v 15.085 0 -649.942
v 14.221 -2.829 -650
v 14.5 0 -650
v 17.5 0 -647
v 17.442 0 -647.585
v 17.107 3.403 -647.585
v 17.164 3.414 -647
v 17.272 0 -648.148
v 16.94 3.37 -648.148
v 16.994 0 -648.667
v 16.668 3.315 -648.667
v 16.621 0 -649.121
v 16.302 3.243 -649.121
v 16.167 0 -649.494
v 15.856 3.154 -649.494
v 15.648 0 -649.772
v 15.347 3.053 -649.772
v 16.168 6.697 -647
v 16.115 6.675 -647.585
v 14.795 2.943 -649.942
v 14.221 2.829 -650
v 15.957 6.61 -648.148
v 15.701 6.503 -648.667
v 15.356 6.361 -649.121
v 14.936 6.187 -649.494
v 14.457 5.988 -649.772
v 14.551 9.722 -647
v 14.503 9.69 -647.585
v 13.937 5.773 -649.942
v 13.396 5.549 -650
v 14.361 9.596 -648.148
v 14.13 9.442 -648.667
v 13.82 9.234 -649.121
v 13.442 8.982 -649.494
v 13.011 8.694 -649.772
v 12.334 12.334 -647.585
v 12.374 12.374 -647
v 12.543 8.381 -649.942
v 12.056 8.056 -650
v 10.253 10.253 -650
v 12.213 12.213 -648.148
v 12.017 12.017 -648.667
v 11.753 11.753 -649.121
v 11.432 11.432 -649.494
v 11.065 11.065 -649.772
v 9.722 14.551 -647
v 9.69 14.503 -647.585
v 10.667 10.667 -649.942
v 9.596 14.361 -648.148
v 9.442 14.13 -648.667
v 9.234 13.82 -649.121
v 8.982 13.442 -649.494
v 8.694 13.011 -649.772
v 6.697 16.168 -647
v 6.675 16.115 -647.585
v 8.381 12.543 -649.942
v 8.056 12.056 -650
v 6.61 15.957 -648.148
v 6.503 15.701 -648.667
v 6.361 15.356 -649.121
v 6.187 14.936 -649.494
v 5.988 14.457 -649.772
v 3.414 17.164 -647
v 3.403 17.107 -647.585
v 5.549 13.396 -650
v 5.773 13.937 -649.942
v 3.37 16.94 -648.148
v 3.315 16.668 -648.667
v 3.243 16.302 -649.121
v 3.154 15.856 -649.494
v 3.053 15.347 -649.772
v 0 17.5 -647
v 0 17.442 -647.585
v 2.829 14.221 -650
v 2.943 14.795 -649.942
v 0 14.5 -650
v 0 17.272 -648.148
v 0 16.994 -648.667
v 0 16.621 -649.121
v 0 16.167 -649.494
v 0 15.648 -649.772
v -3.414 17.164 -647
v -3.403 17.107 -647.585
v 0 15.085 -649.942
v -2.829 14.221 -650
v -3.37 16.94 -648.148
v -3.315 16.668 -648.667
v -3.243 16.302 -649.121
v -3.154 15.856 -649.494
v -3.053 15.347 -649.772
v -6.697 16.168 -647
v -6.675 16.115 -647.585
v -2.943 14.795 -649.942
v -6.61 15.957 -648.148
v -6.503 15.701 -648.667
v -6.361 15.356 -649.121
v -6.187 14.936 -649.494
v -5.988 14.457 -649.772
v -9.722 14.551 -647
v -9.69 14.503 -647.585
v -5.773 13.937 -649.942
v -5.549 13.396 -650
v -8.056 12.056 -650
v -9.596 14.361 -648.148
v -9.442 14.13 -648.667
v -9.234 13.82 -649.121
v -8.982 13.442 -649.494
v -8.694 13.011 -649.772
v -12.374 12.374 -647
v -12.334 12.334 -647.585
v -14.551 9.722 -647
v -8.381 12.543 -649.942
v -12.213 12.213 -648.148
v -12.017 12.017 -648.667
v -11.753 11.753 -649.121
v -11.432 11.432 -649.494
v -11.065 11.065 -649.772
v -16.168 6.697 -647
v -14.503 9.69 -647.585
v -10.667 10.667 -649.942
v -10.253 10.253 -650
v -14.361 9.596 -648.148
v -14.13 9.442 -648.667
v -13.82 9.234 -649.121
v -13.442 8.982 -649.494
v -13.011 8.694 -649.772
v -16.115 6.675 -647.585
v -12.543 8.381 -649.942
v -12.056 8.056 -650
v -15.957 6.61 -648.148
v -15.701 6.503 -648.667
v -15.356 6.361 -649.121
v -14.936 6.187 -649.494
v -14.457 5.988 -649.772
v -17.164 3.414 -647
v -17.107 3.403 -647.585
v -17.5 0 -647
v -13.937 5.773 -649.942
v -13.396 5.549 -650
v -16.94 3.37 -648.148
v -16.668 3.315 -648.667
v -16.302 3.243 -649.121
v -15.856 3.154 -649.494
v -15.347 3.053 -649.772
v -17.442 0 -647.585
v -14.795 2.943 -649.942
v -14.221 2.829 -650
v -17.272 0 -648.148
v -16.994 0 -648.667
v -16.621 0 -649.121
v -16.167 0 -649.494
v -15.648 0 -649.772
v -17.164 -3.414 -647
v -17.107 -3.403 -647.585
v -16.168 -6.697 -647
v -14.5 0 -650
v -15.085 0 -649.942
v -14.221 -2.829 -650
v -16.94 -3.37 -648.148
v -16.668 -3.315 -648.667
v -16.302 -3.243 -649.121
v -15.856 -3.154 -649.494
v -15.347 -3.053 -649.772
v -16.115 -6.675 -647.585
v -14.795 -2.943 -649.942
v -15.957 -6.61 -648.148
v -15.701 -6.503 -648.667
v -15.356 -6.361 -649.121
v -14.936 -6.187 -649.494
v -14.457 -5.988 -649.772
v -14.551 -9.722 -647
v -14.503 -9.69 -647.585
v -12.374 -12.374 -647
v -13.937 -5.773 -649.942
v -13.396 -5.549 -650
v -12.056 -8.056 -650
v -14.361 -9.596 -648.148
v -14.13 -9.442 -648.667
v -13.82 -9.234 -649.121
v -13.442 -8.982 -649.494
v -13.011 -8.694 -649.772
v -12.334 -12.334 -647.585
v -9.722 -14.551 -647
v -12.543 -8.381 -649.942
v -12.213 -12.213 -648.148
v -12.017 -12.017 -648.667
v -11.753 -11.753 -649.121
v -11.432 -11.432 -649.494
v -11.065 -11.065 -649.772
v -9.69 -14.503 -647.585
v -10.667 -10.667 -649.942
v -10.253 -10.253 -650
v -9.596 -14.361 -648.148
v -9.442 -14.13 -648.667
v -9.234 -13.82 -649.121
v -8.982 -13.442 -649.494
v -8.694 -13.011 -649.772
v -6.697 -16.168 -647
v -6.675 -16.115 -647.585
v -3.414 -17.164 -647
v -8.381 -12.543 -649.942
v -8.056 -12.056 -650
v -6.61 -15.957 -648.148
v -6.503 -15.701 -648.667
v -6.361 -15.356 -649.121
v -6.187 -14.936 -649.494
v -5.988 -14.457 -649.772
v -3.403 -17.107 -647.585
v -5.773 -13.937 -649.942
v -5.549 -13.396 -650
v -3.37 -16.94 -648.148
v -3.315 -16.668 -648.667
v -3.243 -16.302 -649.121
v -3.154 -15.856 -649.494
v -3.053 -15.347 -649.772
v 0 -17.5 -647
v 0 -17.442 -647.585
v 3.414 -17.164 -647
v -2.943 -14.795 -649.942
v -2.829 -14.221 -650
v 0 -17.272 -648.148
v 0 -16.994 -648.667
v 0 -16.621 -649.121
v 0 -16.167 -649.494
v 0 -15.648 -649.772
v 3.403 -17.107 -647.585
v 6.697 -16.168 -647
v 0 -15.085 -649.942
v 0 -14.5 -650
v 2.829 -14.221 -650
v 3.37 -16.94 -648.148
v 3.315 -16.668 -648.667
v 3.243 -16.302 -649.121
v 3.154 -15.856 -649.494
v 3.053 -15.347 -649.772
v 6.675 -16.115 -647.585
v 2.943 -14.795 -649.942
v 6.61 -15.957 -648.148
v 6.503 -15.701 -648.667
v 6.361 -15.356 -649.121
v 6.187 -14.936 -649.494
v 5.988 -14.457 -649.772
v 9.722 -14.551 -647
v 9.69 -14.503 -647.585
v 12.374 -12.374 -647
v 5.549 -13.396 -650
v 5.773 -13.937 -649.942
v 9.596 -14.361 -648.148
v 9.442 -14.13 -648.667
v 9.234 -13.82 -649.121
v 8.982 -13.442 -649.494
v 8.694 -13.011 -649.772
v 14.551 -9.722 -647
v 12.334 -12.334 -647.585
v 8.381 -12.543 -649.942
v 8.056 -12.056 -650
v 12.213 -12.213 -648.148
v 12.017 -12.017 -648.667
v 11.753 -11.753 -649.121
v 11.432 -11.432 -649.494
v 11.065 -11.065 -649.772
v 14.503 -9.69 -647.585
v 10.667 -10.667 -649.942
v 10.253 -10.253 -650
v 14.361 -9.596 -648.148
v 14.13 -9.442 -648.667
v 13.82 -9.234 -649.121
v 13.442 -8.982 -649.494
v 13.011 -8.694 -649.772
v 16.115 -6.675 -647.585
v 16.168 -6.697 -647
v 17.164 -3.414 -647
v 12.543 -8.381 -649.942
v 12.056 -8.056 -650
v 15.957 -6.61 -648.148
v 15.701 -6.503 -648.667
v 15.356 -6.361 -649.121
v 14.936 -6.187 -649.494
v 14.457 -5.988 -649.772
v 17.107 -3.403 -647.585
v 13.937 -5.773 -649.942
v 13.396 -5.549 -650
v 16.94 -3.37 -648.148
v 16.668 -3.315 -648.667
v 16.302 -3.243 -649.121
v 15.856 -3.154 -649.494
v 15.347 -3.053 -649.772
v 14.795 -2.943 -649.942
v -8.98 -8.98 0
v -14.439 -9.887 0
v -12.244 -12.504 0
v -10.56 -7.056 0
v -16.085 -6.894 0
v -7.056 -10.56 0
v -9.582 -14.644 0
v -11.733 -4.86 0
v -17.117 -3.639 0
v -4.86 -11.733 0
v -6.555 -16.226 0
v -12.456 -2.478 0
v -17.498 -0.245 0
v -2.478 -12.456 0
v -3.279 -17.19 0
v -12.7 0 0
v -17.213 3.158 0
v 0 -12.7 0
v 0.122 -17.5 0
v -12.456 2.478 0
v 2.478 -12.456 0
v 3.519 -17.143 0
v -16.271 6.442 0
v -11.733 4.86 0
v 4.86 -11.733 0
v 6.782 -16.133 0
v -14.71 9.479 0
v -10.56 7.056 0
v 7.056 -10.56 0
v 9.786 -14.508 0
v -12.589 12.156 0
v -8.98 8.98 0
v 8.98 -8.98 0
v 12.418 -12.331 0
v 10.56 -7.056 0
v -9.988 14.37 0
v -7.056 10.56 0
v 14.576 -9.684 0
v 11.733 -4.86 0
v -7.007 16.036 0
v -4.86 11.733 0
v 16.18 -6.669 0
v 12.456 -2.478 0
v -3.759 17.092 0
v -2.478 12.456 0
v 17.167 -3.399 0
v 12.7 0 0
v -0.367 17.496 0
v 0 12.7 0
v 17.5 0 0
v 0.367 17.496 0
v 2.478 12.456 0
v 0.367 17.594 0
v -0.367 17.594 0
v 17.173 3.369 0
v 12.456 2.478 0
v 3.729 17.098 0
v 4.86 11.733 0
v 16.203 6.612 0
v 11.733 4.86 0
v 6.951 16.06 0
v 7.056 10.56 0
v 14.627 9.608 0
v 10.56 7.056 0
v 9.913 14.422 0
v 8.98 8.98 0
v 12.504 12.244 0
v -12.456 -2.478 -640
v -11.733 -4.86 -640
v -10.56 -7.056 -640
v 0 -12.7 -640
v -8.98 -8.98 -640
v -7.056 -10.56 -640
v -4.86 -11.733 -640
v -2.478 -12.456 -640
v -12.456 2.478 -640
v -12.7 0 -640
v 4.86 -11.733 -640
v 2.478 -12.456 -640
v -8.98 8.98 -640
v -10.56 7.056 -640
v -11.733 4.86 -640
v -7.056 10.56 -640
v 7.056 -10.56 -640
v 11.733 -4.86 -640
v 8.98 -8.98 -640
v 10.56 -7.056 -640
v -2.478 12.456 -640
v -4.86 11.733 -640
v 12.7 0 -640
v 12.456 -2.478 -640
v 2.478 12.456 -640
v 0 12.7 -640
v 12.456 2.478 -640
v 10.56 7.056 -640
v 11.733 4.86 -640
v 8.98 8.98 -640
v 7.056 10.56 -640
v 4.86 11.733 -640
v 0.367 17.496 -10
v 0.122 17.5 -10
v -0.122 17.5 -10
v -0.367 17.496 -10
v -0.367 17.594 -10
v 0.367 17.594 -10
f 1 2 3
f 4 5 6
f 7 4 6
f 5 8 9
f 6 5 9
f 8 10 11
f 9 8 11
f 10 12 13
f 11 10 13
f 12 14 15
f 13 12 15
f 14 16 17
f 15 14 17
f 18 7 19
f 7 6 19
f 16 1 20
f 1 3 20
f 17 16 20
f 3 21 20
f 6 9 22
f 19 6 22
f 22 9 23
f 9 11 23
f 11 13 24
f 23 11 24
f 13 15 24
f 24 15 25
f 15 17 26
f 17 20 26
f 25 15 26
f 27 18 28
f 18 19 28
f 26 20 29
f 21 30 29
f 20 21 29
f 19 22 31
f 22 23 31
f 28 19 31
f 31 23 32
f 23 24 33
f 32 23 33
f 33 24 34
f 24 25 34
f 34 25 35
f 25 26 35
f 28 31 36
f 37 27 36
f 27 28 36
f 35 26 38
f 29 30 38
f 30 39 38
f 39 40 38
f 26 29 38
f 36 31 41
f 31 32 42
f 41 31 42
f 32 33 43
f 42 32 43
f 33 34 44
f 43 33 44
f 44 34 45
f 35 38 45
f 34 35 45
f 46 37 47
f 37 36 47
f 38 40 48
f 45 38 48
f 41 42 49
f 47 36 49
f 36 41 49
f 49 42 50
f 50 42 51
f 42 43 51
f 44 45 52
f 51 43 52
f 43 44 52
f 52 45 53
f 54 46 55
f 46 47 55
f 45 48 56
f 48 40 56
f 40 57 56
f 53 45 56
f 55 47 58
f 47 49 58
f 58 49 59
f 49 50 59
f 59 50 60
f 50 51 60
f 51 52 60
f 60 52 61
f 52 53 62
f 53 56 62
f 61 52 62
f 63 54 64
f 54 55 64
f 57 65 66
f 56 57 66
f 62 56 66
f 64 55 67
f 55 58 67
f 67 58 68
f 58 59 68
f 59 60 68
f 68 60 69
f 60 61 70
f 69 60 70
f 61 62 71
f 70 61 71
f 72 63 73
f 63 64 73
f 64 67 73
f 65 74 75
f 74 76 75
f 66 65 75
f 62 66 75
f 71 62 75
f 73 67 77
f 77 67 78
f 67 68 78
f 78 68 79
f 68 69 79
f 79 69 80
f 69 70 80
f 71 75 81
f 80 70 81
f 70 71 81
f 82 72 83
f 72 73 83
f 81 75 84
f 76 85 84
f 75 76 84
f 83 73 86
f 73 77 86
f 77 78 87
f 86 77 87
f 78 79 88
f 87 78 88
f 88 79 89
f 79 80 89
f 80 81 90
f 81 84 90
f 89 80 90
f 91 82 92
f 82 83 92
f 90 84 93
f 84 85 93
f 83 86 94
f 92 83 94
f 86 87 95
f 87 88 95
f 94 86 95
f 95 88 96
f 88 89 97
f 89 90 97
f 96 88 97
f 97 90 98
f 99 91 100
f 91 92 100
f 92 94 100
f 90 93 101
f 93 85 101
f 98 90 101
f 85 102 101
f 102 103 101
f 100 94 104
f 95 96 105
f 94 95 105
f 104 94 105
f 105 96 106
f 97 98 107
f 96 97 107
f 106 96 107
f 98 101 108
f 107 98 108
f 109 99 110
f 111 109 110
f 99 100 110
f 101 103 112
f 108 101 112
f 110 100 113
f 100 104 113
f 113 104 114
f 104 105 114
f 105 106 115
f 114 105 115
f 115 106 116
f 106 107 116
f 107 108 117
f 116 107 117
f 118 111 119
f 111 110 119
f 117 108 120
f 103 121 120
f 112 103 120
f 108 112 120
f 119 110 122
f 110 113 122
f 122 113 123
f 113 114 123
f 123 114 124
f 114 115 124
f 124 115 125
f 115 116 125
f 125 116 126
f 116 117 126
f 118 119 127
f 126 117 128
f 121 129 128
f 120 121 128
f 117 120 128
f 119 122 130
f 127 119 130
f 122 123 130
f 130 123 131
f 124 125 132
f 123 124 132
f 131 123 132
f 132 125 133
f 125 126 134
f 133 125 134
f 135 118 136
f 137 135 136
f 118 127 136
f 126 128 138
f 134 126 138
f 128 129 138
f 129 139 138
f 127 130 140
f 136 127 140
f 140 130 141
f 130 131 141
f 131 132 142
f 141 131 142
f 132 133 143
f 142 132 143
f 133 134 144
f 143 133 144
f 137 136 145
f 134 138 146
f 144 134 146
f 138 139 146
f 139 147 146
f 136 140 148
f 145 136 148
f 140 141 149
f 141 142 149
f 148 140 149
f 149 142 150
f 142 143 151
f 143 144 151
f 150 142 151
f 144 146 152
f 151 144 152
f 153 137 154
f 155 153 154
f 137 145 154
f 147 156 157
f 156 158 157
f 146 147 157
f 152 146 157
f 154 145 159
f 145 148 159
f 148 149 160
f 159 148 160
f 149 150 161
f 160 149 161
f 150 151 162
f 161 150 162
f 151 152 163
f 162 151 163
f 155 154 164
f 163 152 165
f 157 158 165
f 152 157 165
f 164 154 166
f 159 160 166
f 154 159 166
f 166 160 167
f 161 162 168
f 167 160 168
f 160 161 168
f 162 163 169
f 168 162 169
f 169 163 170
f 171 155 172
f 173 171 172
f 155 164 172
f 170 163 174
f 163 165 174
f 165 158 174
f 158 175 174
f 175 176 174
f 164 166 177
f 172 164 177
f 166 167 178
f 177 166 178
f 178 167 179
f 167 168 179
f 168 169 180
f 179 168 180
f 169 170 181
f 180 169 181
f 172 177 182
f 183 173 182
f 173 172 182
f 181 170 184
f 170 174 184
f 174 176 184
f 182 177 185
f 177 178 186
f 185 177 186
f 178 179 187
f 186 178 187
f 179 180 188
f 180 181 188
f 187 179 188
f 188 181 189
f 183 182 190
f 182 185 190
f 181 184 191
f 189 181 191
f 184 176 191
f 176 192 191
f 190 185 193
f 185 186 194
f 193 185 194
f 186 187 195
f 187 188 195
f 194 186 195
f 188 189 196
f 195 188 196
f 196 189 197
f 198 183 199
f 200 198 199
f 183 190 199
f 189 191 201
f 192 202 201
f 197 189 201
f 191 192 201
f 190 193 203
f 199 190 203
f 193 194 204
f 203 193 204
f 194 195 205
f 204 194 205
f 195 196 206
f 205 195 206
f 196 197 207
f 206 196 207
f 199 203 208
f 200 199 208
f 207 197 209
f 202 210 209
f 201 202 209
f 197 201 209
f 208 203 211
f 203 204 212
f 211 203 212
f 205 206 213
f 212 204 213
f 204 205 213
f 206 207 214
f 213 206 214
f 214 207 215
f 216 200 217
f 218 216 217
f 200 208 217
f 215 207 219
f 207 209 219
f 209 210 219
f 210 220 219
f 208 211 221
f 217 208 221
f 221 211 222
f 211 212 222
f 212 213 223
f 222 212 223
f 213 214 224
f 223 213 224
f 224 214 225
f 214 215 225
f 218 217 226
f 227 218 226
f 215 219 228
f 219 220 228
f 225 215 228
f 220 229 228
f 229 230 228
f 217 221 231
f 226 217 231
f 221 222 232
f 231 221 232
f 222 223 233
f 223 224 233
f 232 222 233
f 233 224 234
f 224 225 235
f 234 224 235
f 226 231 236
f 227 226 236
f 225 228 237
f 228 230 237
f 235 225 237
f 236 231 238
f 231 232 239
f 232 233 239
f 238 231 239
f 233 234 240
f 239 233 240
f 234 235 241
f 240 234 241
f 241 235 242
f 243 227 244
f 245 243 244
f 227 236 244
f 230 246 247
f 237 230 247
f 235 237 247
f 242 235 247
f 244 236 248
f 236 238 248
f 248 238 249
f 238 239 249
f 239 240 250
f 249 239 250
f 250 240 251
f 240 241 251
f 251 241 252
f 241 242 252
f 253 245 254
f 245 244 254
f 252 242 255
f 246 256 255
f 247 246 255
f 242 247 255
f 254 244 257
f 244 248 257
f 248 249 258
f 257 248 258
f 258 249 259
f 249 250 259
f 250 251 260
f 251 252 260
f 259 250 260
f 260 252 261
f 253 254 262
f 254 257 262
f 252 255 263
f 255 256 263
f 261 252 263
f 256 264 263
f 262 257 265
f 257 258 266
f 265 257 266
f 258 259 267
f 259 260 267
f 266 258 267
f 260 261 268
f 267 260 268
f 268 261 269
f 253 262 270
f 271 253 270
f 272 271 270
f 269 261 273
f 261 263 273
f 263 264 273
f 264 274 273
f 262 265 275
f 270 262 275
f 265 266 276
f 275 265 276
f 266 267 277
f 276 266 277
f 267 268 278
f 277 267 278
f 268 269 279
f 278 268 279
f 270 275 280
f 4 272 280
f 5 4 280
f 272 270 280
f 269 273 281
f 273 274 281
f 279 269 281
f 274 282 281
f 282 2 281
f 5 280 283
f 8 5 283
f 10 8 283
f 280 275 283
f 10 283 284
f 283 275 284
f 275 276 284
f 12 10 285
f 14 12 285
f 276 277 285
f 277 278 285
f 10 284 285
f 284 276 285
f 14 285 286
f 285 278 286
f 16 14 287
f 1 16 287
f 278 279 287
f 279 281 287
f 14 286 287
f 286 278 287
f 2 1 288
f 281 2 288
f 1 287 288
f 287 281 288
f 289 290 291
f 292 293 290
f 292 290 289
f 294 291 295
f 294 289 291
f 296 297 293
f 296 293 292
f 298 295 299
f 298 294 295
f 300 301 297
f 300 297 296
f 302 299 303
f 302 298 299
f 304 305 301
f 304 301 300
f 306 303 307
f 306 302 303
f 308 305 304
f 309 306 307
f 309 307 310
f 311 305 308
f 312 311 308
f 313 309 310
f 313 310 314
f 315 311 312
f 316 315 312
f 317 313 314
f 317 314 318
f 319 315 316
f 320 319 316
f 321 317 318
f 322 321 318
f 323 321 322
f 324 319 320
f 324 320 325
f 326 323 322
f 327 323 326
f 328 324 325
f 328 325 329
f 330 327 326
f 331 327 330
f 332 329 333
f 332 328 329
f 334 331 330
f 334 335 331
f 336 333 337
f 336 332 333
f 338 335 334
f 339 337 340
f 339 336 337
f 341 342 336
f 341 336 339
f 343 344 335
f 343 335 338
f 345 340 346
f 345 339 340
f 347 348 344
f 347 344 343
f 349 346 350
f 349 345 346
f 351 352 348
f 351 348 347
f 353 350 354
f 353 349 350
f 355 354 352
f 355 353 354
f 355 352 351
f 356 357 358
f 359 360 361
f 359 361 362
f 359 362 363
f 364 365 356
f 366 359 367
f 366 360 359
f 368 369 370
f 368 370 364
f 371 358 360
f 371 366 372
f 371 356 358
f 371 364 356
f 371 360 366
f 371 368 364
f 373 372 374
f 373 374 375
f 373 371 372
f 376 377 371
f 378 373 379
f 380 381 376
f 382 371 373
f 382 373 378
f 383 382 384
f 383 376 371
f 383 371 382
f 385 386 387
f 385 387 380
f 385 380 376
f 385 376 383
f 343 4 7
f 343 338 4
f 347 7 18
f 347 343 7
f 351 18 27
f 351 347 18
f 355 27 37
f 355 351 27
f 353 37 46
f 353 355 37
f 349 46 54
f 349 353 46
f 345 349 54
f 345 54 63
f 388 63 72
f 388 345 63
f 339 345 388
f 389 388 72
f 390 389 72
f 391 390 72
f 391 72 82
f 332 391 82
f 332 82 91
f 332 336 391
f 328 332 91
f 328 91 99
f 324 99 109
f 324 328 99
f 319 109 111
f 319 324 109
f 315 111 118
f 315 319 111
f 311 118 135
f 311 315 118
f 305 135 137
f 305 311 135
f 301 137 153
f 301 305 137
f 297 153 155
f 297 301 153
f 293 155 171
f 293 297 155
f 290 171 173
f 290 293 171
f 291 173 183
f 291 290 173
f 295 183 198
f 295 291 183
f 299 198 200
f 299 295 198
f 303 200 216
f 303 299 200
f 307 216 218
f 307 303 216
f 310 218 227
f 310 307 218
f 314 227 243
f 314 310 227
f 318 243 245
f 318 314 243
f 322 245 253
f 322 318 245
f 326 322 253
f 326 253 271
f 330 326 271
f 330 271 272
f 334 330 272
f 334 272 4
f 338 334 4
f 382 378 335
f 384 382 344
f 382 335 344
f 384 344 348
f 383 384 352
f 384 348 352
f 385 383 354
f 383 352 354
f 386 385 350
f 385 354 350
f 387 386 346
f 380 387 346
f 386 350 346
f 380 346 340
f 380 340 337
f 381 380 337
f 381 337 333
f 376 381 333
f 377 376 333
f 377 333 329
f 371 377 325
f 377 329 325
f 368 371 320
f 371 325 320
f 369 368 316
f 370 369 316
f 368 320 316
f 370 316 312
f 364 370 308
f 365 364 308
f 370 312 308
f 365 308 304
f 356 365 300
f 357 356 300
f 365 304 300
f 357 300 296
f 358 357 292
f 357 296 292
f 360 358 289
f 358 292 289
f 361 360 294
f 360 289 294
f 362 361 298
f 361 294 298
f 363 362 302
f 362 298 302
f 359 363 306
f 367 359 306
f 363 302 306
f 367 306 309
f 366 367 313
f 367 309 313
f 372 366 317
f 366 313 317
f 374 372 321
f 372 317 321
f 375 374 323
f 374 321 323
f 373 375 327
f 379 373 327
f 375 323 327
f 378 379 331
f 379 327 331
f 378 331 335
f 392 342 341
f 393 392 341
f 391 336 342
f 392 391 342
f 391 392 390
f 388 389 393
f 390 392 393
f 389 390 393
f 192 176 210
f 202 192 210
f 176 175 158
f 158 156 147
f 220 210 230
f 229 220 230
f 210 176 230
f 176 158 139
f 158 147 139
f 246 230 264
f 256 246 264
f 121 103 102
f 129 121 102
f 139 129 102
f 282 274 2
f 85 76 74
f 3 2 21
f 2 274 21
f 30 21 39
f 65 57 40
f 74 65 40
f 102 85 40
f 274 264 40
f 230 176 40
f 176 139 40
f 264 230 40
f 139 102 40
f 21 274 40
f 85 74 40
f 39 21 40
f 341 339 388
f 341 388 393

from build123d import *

# Parameters (mm, degrees)
CROQUIS2_R              = 17.5
SALIENTE_EXTRUIR1_DEPTH = 650
CROQUIS3_R              = 12.7
CORTAR_EXTRUIR1_DEPTH   = 640
REDONDEO1_R             = 3
CROQUIS4_W              = 0.7347375
CROQUIS4_H              = 0.188618068
SALIENTE_EXTRUIR2_DEPTH = 10


with BuildPart() as part:
    # Croquis2 → Saliente-Extruir1 (new body)
    with BuildSketch(Plane.XY):
        Circle(CROQUIS2_R)
    extrude(amount=-SALIENTE_EXTRUIR1_DEPTH)

    # Croquis3 → Cortar-Extruir1 (cut)
    with BuildSketch(Plane.XY):
        Circle(CROQUIS3_R)
    extrude(amount=-CORTAR_EXTRUIR1_DEPTH, mode=Mode.SUBTRACT)

    # Redondeo1
    redondeo1_edges = [part.edges().sort_by_distance(p)[0] for p in [
        (-17.5, 0, -650),
    ]]
    fillet(redondeo1_edges, radius=REDONDEO1_R)

    # Croquis4 → Saliente-Extruir2 (add)
    with BuildSketch(Plane.XY):
        with Locations((0, 17.5)):
            Rectangle(CROQUIS4_W, CROQUIS4_H)
    extrude(amount=-SALIENTE_EXTRUIR2_DEPTH)


solid = part.part
